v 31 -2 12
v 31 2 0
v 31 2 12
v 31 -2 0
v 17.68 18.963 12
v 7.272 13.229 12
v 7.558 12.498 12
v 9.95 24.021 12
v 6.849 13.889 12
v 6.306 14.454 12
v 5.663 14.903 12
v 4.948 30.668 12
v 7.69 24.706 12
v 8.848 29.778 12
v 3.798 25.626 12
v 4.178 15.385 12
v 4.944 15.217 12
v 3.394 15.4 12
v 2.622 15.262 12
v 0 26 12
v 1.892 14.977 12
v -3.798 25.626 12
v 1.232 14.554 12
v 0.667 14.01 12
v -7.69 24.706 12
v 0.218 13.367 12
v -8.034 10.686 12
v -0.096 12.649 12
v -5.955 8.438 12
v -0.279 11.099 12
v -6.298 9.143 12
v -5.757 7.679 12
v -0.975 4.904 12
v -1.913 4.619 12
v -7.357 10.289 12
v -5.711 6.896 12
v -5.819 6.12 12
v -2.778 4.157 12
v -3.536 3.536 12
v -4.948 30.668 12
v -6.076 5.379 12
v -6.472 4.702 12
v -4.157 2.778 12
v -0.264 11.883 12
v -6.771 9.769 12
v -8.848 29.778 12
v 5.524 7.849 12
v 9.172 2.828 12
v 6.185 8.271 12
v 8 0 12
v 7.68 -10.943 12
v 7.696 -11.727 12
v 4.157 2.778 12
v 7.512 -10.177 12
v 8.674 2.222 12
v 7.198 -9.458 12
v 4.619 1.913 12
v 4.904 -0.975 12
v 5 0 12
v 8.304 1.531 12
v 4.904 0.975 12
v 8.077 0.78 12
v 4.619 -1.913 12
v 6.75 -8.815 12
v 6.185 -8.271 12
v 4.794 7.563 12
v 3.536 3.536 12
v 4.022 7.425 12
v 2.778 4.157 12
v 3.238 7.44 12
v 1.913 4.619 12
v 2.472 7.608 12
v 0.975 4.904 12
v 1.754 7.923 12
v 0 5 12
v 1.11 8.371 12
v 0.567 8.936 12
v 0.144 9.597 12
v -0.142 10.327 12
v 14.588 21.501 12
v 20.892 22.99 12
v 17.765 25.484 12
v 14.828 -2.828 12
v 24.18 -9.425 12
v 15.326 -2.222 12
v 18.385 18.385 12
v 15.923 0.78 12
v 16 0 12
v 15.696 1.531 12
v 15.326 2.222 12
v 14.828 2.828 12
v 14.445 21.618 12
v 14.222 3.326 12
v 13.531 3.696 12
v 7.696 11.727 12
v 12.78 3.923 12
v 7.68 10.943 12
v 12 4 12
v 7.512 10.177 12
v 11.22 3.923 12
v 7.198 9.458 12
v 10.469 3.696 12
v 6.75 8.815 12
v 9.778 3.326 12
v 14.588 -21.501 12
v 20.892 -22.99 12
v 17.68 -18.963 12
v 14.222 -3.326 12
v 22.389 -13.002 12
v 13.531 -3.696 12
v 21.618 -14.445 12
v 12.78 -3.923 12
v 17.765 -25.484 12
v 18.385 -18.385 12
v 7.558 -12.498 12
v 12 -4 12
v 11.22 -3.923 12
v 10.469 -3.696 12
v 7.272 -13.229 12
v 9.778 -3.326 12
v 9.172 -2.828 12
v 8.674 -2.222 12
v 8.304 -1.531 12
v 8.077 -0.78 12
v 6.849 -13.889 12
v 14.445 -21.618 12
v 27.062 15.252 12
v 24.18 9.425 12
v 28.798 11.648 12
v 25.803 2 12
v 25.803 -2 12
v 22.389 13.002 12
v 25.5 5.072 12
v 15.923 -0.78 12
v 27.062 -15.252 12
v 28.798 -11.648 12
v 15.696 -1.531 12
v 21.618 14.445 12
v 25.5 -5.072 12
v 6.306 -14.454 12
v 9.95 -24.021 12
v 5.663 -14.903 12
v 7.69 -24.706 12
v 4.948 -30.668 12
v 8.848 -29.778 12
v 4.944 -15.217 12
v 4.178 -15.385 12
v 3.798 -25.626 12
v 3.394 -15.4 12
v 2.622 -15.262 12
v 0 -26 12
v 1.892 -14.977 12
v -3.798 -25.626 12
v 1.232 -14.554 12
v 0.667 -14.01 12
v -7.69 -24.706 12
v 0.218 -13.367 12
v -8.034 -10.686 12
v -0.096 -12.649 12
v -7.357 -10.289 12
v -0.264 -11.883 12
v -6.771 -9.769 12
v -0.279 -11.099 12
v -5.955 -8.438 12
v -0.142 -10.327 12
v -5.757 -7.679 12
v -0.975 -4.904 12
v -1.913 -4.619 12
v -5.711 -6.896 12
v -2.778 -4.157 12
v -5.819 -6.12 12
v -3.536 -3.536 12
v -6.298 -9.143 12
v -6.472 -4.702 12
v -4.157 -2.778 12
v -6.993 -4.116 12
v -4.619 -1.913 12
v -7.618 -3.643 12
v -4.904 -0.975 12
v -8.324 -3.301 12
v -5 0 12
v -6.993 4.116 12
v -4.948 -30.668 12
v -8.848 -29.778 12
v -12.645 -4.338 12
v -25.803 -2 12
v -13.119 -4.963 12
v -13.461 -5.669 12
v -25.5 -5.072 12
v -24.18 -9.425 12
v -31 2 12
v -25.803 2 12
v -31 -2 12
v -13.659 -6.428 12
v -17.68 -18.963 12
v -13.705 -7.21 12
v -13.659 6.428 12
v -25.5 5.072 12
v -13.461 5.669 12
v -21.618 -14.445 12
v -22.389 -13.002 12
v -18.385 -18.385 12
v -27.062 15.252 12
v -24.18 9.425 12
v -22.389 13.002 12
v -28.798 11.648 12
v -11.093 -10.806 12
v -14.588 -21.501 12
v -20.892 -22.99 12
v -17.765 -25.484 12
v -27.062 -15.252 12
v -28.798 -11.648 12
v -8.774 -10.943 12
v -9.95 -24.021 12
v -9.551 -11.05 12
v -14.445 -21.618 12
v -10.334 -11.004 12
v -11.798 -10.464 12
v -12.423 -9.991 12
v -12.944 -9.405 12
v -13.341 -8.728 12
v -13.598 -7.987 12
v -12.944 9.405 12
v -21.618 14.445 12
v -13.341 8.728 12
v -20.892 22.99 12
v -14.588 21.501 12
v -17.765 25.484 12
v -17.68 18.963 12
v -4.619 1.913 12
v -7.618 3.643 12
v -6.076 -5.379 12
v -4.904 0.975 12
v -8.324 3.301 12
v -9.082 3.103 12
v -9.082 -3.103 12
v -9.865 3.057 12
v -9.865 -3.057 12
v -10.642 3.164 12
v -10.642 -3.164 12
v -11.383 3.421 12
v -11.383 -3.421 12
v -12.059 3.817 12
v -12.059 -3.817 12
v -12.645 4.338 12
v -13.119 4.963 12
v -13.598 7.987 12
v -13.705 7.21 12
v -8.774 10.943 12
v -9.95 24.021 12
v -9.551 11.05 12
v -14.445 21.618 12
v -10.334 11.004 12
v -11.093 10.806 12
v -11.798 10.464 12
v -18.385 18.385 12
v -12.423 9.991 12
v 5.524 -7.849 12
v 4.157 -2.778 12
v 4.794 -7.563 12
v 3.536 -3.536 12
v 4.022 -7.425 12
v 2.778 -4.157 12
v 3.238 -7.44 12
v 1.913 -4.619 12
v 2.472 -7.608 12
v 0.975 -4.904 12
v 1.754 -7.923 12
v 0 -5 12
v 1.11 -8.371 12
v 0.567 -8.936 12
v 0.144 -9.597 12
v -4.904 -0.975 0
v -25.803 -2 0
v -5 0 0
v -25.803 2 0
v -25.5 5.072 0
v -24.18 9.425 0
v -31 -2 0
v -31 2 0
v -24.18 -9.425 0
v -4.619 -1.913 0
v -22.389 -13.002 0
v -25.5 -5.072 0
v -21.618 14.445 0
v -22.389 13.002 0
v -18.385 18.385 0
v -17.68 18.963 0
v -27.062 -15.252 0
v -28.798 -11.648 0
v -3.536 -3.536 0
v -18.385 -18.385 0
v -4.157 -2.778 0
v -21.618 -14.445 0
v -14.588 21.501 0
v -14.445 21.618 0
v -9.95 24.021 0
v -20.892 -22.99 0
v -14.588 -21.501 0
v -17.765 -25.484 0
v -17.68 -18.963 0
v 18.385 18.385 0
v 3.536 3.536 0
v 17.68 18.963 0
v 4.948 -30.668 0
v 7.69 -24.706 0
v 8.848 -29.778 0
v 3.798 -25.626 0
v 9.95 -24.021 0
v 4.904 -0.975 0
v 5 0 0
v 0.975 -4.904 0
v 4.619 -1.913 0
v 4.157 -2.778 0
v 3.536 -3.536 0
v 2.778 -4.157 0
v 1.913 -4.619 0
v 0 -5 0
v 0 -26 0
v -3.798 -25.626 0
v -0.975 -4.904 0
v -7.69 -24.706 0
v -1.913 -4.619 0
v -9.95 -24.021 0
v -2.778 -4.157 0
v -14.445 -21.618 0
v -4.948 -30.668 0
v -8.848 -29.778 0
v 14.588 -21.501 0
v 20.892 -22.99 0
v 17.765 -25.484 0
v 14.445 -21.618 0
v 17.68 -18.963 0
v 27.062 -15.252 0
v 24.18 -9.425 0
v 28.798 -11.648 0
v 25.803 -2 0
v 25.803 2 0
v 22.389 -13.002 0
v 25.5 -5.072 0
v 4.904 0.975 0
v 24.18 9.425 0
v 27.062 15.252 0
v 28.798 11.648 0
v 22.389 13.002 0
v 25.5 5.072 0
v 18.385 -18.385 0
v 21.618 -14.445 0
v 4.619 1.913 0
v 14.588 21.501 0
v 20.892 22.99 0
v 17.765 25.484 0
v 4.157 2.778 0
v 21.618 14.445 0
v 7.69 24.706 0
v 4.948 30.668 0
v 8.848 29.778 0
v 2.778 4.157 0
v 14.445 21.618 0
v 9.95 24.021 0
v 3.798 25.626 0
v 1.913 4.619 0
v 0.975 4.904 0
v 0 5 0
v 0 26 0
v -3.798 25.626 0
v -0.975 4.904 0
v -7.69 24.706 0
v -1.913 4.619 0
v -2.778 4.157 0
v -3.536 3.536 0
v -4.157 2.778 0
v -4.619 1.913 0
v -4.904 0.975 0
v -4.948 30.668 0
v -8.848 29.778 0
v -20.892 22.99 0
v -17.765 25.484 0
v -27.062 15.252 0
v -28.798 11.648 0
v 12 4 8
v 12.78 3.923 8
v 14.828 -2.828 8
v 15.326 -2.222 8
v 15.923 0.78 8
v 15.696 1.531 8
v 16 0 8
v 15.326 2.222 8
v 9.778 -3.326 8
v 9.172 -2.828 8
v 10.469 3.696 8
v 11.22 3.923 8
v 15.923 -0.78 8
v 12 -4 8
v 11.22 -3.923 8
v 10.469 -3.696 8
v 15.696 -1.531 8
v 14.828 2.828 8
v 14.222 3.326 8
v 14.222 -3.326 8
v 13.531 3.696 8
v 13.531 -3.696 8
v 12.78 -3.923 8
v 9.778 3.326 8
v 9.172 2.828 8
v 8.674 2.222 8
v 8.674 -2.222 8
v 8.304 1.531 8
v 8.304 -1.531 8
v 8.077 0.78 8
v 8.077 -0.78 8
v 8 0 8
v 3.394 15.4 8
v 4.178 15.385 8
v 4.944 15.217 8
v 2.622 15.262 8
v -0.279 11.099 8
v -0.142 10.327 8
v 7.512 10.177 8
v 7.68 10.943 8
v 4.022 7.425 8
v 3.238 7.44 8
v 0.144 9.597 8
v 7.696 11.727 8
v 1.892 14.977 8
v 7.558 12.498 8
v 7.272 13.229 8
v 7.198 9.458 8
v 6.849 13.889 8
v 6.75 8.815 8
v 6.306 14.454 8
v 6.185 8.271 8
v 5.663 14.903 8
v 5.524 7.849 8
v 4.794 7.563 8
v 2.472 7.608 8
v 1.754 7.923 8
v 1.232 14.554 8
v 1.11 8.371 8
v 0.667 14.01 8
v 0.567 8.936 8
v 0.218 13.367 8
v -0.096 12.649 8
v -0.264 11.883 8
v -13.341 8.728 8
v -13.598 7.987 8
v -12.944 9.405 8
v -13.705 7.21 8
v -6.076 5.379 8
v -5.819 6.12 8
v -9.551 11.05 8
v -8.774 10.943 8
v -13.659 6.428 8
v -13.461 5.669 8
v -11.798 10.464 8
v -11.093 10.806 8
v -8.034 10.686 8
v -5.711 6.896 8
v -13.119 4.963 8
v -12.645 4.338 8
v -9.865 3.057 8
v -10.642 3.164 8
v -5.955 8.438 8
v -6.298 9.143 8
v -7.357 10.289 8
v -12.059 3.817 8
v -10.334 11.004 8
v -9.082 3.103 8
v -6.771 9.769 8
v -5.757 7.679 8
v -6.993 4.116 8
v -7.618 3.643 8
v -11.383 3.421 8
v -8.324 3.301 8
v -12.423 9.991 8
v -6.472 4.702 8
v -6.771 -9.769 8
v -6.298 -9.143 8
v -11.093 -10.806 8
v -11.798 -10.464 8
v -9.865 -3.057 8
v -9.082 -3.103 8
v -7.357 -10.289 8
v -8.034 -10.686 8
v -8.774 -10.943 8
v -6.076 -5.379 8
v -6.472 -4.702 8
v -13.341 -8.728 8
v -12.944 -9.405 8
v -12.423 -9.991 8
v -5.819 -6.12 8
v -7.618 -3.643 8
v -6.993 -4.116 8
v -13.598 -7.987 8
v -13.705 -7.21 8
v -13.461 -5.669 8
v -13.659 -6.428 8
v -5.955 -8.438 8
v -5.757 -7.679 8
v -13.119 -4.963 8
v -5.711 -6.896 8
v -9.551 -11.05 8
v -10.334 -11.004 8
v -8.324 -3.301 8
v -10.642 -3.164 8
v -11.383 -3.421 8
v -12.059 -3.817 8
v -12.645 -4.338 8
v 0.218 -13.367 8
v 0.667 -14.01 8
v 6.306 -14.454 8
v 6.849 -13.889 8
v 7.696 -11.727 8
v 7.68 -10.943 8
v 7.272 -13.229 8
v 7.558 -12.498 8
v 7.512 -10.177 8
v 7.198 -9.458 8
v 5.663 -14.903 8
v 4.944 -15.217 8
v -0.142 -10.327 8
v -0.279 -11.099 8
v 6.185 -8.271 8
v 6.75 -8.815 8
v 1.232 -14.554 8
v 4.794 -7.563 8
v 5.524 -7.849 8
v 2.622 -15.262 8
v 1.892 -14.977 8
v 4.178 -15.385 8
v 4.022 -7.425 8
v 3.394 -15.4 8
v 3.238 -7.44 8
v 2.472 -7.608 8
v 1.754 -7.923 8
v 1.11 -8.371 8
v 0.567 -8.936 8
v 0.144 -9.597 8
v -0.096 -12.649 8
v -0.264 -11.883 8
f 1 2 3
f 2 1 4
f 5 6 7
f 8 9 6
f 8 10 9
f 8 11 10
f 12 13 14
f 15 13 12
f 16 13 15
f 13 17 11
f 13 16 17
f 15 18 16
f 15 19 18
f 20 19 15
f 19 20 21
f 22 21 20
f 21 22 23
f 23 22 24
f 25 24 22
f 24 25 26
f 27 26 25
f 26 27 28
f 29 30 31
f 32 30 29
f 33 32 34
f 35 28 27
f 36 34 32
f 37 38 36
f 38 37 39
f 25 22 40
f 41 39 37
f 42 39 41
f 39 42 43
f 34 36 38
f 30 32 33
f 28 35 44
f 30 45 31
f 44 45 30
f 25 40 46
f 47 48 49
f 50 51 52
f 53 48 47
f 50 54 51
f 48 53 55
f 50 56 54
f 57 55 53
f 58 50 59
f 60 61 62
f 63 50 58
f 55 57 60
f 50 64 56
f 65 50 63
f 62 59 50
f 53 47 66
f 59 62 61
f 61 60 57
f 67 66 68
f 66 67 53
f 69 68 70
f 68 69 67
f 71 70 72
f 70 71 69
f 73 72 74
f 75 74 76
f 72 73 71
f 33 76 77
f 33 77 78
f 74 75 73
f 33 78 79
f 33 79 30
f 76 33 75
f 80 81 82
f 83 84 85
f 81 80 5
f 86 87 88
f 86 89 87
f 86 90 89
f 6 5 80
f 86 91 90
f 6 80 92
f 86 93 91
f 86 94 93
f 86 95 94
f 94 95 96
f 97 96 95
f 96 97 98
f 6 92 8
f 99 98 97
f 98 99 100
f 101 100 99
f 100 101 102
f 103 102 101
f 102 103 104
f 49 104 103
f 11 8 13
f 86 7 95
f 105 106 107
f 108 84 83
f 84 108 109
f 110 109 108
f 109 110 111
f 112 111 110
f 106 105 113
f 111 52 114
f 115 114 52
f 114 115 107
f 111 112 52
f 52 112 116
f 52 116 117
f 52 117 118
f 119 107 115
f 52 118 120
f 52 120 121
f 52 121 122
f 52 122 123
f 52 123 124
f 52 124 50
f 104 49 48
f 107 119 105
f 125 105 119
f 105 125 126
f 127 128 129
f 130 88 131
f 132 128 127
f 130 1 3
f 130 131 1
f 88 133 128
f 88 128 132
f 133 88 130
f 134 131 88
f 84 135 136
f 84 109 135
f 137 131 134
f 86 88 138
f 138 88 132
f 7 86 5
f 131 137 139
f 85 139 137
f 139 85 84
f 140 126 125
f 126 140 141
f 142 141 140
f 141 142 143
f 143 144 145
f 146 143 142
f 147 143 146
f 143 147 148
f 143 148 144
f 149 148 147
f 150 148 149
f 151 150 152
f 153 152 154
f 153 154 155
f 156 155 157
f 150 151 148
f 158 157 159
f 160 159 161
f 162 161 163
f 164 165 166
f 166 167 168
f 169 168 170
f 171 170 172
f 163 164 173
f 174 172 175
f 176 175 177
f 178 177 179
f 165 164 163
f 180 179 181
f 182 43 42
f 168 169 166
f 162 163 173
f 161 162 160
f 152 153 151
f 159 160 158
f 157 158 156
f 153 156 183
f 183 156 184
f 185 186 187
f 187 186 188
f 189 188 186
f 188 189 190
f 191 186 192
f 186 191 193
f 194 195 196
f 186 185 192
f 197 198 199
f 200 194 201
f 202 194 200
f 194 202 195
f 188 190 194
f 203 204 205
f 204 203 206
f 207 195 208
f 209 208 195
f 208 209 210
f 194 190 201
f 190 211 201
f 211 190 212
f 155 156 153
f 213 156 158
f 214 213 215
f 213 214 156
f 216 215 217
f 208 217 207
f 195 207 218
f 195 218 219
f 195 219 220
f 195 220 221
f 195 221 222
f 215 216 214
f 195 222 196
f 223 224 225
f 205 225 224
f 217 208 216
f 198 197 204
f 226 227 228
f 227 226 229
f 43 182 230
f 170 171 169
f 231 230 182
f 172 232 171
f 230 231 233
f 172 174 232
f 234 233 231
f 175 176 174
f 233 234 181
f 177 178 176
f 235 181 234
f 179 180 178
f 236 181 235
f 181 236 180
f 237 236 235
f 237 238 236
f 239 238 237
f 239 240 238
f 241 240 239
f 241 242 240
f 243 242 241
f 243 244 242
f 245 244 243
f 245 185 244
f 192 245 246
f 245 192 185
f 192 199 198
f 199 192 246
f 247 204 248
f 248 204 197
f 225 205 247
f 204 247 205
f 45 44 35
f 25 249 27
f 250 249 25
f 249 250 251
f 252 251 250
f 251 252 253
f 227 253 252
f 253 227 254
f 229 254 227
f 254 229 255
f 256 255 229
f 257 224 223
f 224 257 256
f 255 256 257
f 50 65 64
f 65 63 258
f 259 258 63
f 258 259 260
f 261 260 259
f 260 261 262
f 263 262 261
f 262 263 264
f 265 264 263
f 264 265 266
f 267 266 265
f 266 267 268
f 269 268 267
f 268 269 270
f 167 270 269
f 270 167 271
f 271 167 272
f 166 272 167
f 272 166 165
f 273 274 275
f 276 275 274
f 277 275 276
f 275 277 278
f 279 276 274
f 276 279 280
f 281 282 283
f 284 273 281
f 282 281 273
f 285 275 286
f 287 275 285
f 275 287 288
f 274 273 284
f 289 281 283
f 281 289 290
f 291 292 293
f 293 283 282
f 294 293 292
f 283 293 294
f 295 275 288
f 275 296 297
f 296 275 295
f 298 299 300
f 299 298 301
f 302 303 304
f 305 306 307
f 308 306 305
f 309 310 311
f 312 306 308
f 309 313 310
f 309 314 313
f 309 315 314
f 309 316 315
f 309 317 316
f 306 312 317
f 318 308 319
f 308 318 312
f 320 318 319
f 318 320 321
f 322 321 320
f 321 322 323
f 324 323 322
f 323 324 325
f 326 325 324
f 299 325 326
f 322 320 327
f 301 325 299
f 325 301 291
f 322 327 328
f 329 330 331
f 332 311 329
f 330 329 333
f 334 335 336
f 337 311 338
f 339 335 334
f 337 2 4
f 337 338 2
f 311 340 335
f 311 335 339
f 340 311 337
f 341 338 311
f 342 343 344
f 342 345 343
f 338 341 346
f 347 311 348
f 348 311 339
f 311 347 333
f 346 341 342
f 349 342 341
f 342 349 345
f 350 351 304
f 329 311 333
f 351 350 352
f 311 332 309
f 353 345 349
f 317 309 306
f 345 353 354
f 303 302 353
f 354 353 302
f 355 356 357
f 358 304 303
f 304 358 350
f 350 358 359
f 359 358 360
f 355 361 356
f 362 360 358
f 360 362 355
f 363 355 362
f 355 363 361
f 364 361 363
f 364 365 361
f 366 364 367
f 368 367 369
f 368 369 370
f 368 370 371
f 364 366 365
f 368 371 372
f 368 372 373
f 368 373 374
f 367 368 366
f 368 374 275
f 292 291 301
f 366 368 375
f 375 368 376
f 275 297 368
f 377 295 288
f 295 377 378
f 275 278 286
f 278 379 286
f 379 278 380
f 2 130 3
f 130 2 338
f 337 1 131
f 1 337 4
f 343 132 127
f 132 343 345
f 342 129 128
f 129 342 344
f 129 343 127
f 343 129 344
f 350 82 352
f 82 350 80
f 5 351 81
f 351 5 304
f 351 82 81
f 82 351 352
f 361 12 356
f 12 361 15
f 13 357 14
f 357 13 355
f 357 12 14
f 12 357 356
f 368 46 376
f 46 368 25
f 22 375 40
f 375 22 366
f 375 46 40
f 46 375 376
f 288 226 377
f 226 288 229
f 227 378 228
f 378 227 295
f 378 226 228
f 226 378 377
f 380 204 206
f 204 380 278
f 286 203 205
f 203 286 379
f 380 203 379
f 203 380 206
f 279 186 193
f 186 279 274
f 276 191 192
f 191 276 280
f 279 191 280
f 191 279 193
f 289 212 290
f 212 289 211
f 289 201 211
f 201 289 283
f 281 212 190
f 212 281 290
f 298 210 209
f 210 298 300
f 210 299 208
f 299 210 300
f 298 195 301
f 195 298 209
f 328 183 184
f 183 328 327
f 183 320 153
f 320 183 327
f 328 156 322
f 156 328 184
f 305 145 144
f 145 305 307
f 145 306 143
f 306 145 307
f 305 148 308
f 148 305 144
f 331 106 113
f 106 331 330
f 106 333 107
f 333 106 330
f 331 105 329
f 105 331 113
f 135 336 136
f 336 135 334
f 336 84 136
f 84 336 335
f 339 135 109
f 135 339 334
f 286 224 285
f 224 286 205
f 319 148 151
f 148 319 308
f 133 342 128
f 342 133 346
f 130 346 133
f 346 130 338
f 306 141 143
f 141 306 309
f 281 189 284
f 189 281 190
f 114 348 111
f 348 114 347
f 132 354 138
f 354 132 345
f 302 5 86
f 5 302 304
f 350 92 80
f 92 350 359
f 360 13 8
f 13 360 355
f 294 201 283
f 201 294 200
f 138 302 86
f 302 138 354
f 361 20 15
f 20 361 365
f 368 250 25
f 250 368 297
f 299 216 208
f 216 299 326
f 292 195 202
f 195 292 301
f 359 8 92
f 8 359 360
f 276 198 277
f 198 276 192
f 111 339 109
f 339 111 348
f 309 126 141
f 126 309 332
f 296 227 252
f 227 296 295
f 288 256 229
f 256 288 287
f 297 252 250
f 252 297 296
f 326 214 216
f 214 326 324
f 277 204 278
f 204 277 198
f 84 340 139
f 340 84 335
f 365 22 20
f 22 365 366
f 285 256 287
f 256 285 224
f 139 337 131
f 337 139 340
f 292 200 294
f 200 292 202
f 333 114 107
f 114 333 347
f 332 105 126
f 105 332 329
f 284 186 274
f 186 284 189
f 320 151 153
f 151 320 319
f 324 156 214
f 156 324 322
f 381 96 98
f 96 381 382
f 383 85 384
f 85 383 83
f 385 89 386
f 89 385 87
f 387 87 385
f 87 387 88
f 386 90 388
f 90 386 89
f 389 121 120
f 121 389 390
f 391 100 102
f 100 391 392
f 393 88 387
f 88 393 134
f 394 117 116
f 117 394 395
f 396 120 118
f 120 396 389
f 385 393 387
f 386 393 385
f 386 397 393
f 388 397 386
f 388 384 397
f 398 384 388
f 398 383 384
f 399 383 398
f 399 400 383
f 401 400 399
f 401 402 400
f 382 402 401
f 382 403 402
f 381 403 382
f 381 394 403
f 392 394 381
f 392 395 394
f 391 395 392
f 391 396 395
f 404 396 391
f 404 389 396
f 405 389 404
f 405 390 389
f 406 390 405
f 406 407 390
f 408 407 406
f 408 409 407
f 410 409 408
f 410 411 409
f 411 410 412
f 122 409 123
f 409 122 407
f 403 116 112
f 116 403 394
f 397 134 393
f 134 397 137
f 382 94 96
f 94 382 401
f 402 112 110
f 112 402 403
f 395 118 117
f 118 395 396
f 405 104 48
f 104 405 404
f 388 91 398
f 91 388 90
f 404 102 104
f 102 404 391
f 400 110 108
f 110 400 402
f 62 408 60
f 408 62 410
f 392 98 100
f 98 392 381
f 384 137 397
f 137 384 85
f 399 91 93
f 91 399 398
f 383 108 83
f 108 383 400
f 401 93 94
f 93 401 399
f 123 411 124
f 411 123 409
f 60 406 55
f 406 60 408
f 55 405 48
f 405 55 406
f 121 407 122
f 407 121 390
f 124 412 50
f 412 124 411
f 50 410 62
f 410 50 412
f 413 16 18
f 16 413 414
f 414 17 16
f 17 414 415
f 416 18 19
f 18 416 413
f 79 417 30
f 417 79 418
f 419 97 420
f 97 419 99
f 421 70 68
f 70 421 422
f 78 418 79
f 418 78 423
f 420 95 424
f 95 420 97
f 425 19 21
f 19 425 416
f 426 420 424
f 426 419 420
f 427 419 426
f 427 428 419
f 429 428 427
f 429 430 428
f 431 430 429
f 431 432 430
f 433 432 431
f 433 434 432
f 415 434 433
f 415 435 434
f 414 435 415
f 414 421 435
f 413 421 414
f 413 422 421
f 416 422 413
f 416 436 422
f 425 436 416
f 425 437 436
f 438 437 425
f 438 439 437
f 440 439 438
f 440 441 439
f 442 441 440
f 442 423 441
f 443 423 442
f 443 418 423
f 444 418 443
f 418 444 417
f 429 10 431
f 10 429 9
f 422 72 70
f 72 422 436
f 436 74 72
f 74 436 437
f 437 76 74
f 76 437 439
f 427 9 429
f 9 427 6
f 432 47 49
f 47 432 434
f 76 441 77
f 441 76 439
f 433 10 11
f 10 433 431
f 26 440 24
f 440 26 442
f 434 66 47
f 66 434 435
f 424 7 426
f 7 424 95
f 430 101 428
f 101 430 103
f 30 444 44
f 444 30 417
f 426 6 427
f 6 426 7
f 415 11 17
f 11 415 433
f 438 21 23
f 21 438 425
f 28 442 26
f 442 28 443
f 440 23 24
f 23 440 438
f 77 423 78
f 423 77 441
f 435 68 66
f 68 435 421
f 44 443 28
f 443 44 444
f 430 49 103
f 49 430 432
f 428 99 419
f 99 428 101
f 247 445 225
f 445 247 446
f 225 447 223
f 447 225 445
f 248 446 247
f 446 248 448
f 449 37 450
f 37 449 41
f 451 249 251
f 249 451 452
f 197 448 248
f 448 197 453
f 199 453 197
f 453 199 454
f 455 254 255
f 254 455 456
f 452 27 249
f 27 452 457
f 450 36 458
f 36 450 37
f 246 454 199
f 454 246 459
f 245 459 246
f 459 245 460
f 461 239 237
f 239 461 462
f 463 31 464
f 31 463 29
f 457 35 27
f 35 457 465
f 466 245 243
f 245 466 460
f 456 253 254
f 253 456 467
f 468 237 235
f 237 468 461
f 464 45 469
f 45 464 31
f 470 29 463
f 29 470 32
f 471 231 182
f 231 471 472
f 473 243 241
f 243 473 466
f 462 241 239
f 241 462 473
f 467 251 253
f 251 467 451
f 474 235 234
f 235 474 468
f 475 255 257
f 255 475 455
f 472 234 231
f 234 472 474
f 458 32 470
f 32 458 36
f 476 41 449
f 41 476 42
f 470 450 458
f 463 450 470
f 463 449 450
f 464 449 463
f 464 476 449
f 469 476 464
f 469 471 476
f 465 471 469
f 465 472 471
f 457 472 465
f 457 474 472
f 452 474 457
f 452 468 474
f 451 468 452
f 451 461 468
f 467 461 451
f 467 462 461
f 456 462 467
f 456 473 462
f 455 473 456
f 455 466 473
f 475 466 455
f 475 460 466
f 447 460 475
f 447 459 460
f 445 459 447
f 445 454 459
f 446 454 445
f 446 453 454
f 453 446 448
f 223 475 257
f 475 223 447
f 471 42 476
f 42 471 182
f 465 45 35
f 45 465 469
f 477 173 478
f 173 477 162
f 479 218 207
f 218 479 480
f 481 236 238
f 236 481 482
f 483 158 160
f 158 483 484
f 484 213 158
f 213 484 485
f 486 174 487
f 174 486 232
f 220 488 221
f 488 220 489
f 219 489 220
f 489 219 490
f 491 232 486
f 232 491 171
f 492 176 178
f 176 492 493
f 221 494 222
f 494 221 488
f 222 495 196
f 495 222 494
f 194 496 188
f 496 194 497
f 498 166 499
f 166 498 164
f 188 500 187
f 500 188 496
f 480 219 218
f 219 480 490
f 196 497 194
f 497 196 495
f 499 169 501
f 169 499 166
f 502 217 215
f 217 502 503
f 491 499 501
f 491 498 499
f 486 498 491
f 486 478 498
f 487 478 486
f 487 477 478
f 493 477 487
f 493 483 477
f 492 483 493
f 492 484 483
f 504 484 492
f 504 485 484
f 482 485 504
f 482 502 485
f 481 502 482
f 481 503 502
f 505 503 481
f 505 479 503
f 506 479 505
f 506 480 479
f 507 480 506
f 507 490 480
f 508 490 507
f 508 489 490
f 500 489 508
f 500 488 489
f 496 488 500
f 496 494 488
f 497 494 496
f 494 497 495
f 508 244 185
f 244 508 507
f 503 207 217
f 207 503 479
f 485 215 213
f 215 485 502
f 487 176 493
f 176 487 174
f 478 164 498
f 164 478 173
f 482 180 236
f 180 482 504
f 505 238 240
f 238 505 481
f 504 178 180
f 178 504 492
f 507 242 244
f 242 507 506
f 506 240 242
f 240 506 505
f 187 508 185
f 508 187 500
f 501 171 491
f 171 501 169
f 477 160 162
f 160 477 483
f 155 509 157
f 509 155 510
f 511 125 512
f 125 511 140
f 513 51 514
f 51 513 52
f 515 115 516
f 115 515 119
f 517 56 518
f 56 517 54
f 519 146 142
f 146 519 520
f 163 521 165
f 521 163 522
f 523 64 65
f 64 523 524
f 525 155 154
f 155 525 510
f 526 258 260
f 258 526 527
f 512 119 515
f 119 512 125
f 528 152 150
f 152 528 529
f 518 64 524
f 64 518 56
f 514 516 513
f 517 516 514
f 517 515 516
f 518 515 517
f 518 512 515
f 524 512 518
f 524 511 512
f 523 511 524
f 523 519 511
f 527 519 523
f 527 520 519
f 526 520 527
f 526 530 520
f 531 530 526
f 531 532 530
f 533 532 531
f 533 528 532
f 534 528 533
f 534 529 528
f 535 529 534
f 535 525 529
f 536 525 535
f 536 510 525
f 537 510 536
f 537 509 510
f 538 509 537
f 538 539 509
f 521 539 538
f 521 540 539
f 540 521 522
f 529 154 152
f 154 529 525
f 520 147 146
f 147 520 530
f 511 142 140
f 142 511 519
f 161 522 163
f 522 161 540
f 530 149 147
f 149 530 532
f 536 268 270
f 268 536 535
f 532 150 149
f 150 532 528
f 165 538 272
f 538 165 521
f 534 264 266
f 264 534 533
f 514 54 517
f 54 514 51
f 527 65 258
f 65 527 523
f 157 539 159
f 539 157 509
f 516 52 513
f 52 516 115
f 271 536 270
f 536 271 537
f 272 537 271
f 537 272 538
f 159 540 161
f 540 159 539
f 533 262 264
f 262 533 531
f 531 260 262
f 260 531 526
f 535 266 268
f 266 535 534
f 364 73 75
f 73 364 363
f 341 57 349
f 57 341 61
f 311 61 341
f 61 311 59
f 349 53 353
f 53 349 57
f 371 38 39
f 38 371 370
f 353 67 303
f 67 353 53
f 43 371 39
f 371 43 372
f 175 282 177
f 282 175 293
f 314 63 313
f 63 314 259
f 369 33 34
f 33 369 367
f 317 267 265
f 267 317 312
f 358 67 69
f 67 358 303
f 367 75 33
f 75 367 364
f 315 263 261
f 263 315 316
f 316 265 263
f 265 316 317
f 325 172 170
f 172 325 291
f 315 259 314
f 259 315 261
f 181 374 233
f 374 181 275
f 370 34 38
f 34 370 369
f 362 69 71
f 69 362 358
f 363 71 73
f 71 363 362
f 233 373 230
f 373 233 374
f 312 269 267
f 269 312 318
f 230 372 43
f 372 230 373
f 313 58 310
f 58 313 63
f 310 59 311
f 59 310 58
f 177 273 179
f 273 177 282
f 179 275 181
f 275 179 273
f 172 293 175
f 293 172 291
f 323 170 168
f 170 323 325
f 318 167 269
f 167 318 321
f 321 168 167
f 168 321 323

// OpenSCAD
$fn = 32;

// ----------------------------------------------------------------------
// Spur blank: lightened gear blank
// ----------------------------------------------------------------------

// --- parameters (mm) ---
disc_r = 26;              // blank root radius
disc_t = 12;              // blank thickness
n_teeth = 14;             // stub tooth count
tooth_w = 4;              // tooth width at the root
tooth_h = 5;              // tooth height above the root
bore_r = 5;               // central bore radius
ring_r = 12;              // lightening pocket ring radius
pocket_r = 4;             // lightening pocket radius

out_r = disc_r + tooth_h;  // tip radius
bbox_x = 62.0;  // measured width over the teeth
bbox_y = 61.34;  // measured depth over the teeth

difference() {
union() {
  cylinder(r = disc_r, h = disc_t);
  for (i = [0 : n_teeth - 1])
    rotate([0, 0, i * 360 / n_teeth])
      translate([disc_r - 1, -tooth_w / 2, 0])
        cube([tooth_h + 1, tooth_w, disc_t]);
}
  translate([0, 0, -1]) cylinder(r = bore_r, h = disc_t + 2);
  for (i = [0 : 5])
    rotate([0, 0, i * 72])
      translate([ring_r, 0, disc_t - 4])
        cylinder(r = pocket_r, h = 5);
}
